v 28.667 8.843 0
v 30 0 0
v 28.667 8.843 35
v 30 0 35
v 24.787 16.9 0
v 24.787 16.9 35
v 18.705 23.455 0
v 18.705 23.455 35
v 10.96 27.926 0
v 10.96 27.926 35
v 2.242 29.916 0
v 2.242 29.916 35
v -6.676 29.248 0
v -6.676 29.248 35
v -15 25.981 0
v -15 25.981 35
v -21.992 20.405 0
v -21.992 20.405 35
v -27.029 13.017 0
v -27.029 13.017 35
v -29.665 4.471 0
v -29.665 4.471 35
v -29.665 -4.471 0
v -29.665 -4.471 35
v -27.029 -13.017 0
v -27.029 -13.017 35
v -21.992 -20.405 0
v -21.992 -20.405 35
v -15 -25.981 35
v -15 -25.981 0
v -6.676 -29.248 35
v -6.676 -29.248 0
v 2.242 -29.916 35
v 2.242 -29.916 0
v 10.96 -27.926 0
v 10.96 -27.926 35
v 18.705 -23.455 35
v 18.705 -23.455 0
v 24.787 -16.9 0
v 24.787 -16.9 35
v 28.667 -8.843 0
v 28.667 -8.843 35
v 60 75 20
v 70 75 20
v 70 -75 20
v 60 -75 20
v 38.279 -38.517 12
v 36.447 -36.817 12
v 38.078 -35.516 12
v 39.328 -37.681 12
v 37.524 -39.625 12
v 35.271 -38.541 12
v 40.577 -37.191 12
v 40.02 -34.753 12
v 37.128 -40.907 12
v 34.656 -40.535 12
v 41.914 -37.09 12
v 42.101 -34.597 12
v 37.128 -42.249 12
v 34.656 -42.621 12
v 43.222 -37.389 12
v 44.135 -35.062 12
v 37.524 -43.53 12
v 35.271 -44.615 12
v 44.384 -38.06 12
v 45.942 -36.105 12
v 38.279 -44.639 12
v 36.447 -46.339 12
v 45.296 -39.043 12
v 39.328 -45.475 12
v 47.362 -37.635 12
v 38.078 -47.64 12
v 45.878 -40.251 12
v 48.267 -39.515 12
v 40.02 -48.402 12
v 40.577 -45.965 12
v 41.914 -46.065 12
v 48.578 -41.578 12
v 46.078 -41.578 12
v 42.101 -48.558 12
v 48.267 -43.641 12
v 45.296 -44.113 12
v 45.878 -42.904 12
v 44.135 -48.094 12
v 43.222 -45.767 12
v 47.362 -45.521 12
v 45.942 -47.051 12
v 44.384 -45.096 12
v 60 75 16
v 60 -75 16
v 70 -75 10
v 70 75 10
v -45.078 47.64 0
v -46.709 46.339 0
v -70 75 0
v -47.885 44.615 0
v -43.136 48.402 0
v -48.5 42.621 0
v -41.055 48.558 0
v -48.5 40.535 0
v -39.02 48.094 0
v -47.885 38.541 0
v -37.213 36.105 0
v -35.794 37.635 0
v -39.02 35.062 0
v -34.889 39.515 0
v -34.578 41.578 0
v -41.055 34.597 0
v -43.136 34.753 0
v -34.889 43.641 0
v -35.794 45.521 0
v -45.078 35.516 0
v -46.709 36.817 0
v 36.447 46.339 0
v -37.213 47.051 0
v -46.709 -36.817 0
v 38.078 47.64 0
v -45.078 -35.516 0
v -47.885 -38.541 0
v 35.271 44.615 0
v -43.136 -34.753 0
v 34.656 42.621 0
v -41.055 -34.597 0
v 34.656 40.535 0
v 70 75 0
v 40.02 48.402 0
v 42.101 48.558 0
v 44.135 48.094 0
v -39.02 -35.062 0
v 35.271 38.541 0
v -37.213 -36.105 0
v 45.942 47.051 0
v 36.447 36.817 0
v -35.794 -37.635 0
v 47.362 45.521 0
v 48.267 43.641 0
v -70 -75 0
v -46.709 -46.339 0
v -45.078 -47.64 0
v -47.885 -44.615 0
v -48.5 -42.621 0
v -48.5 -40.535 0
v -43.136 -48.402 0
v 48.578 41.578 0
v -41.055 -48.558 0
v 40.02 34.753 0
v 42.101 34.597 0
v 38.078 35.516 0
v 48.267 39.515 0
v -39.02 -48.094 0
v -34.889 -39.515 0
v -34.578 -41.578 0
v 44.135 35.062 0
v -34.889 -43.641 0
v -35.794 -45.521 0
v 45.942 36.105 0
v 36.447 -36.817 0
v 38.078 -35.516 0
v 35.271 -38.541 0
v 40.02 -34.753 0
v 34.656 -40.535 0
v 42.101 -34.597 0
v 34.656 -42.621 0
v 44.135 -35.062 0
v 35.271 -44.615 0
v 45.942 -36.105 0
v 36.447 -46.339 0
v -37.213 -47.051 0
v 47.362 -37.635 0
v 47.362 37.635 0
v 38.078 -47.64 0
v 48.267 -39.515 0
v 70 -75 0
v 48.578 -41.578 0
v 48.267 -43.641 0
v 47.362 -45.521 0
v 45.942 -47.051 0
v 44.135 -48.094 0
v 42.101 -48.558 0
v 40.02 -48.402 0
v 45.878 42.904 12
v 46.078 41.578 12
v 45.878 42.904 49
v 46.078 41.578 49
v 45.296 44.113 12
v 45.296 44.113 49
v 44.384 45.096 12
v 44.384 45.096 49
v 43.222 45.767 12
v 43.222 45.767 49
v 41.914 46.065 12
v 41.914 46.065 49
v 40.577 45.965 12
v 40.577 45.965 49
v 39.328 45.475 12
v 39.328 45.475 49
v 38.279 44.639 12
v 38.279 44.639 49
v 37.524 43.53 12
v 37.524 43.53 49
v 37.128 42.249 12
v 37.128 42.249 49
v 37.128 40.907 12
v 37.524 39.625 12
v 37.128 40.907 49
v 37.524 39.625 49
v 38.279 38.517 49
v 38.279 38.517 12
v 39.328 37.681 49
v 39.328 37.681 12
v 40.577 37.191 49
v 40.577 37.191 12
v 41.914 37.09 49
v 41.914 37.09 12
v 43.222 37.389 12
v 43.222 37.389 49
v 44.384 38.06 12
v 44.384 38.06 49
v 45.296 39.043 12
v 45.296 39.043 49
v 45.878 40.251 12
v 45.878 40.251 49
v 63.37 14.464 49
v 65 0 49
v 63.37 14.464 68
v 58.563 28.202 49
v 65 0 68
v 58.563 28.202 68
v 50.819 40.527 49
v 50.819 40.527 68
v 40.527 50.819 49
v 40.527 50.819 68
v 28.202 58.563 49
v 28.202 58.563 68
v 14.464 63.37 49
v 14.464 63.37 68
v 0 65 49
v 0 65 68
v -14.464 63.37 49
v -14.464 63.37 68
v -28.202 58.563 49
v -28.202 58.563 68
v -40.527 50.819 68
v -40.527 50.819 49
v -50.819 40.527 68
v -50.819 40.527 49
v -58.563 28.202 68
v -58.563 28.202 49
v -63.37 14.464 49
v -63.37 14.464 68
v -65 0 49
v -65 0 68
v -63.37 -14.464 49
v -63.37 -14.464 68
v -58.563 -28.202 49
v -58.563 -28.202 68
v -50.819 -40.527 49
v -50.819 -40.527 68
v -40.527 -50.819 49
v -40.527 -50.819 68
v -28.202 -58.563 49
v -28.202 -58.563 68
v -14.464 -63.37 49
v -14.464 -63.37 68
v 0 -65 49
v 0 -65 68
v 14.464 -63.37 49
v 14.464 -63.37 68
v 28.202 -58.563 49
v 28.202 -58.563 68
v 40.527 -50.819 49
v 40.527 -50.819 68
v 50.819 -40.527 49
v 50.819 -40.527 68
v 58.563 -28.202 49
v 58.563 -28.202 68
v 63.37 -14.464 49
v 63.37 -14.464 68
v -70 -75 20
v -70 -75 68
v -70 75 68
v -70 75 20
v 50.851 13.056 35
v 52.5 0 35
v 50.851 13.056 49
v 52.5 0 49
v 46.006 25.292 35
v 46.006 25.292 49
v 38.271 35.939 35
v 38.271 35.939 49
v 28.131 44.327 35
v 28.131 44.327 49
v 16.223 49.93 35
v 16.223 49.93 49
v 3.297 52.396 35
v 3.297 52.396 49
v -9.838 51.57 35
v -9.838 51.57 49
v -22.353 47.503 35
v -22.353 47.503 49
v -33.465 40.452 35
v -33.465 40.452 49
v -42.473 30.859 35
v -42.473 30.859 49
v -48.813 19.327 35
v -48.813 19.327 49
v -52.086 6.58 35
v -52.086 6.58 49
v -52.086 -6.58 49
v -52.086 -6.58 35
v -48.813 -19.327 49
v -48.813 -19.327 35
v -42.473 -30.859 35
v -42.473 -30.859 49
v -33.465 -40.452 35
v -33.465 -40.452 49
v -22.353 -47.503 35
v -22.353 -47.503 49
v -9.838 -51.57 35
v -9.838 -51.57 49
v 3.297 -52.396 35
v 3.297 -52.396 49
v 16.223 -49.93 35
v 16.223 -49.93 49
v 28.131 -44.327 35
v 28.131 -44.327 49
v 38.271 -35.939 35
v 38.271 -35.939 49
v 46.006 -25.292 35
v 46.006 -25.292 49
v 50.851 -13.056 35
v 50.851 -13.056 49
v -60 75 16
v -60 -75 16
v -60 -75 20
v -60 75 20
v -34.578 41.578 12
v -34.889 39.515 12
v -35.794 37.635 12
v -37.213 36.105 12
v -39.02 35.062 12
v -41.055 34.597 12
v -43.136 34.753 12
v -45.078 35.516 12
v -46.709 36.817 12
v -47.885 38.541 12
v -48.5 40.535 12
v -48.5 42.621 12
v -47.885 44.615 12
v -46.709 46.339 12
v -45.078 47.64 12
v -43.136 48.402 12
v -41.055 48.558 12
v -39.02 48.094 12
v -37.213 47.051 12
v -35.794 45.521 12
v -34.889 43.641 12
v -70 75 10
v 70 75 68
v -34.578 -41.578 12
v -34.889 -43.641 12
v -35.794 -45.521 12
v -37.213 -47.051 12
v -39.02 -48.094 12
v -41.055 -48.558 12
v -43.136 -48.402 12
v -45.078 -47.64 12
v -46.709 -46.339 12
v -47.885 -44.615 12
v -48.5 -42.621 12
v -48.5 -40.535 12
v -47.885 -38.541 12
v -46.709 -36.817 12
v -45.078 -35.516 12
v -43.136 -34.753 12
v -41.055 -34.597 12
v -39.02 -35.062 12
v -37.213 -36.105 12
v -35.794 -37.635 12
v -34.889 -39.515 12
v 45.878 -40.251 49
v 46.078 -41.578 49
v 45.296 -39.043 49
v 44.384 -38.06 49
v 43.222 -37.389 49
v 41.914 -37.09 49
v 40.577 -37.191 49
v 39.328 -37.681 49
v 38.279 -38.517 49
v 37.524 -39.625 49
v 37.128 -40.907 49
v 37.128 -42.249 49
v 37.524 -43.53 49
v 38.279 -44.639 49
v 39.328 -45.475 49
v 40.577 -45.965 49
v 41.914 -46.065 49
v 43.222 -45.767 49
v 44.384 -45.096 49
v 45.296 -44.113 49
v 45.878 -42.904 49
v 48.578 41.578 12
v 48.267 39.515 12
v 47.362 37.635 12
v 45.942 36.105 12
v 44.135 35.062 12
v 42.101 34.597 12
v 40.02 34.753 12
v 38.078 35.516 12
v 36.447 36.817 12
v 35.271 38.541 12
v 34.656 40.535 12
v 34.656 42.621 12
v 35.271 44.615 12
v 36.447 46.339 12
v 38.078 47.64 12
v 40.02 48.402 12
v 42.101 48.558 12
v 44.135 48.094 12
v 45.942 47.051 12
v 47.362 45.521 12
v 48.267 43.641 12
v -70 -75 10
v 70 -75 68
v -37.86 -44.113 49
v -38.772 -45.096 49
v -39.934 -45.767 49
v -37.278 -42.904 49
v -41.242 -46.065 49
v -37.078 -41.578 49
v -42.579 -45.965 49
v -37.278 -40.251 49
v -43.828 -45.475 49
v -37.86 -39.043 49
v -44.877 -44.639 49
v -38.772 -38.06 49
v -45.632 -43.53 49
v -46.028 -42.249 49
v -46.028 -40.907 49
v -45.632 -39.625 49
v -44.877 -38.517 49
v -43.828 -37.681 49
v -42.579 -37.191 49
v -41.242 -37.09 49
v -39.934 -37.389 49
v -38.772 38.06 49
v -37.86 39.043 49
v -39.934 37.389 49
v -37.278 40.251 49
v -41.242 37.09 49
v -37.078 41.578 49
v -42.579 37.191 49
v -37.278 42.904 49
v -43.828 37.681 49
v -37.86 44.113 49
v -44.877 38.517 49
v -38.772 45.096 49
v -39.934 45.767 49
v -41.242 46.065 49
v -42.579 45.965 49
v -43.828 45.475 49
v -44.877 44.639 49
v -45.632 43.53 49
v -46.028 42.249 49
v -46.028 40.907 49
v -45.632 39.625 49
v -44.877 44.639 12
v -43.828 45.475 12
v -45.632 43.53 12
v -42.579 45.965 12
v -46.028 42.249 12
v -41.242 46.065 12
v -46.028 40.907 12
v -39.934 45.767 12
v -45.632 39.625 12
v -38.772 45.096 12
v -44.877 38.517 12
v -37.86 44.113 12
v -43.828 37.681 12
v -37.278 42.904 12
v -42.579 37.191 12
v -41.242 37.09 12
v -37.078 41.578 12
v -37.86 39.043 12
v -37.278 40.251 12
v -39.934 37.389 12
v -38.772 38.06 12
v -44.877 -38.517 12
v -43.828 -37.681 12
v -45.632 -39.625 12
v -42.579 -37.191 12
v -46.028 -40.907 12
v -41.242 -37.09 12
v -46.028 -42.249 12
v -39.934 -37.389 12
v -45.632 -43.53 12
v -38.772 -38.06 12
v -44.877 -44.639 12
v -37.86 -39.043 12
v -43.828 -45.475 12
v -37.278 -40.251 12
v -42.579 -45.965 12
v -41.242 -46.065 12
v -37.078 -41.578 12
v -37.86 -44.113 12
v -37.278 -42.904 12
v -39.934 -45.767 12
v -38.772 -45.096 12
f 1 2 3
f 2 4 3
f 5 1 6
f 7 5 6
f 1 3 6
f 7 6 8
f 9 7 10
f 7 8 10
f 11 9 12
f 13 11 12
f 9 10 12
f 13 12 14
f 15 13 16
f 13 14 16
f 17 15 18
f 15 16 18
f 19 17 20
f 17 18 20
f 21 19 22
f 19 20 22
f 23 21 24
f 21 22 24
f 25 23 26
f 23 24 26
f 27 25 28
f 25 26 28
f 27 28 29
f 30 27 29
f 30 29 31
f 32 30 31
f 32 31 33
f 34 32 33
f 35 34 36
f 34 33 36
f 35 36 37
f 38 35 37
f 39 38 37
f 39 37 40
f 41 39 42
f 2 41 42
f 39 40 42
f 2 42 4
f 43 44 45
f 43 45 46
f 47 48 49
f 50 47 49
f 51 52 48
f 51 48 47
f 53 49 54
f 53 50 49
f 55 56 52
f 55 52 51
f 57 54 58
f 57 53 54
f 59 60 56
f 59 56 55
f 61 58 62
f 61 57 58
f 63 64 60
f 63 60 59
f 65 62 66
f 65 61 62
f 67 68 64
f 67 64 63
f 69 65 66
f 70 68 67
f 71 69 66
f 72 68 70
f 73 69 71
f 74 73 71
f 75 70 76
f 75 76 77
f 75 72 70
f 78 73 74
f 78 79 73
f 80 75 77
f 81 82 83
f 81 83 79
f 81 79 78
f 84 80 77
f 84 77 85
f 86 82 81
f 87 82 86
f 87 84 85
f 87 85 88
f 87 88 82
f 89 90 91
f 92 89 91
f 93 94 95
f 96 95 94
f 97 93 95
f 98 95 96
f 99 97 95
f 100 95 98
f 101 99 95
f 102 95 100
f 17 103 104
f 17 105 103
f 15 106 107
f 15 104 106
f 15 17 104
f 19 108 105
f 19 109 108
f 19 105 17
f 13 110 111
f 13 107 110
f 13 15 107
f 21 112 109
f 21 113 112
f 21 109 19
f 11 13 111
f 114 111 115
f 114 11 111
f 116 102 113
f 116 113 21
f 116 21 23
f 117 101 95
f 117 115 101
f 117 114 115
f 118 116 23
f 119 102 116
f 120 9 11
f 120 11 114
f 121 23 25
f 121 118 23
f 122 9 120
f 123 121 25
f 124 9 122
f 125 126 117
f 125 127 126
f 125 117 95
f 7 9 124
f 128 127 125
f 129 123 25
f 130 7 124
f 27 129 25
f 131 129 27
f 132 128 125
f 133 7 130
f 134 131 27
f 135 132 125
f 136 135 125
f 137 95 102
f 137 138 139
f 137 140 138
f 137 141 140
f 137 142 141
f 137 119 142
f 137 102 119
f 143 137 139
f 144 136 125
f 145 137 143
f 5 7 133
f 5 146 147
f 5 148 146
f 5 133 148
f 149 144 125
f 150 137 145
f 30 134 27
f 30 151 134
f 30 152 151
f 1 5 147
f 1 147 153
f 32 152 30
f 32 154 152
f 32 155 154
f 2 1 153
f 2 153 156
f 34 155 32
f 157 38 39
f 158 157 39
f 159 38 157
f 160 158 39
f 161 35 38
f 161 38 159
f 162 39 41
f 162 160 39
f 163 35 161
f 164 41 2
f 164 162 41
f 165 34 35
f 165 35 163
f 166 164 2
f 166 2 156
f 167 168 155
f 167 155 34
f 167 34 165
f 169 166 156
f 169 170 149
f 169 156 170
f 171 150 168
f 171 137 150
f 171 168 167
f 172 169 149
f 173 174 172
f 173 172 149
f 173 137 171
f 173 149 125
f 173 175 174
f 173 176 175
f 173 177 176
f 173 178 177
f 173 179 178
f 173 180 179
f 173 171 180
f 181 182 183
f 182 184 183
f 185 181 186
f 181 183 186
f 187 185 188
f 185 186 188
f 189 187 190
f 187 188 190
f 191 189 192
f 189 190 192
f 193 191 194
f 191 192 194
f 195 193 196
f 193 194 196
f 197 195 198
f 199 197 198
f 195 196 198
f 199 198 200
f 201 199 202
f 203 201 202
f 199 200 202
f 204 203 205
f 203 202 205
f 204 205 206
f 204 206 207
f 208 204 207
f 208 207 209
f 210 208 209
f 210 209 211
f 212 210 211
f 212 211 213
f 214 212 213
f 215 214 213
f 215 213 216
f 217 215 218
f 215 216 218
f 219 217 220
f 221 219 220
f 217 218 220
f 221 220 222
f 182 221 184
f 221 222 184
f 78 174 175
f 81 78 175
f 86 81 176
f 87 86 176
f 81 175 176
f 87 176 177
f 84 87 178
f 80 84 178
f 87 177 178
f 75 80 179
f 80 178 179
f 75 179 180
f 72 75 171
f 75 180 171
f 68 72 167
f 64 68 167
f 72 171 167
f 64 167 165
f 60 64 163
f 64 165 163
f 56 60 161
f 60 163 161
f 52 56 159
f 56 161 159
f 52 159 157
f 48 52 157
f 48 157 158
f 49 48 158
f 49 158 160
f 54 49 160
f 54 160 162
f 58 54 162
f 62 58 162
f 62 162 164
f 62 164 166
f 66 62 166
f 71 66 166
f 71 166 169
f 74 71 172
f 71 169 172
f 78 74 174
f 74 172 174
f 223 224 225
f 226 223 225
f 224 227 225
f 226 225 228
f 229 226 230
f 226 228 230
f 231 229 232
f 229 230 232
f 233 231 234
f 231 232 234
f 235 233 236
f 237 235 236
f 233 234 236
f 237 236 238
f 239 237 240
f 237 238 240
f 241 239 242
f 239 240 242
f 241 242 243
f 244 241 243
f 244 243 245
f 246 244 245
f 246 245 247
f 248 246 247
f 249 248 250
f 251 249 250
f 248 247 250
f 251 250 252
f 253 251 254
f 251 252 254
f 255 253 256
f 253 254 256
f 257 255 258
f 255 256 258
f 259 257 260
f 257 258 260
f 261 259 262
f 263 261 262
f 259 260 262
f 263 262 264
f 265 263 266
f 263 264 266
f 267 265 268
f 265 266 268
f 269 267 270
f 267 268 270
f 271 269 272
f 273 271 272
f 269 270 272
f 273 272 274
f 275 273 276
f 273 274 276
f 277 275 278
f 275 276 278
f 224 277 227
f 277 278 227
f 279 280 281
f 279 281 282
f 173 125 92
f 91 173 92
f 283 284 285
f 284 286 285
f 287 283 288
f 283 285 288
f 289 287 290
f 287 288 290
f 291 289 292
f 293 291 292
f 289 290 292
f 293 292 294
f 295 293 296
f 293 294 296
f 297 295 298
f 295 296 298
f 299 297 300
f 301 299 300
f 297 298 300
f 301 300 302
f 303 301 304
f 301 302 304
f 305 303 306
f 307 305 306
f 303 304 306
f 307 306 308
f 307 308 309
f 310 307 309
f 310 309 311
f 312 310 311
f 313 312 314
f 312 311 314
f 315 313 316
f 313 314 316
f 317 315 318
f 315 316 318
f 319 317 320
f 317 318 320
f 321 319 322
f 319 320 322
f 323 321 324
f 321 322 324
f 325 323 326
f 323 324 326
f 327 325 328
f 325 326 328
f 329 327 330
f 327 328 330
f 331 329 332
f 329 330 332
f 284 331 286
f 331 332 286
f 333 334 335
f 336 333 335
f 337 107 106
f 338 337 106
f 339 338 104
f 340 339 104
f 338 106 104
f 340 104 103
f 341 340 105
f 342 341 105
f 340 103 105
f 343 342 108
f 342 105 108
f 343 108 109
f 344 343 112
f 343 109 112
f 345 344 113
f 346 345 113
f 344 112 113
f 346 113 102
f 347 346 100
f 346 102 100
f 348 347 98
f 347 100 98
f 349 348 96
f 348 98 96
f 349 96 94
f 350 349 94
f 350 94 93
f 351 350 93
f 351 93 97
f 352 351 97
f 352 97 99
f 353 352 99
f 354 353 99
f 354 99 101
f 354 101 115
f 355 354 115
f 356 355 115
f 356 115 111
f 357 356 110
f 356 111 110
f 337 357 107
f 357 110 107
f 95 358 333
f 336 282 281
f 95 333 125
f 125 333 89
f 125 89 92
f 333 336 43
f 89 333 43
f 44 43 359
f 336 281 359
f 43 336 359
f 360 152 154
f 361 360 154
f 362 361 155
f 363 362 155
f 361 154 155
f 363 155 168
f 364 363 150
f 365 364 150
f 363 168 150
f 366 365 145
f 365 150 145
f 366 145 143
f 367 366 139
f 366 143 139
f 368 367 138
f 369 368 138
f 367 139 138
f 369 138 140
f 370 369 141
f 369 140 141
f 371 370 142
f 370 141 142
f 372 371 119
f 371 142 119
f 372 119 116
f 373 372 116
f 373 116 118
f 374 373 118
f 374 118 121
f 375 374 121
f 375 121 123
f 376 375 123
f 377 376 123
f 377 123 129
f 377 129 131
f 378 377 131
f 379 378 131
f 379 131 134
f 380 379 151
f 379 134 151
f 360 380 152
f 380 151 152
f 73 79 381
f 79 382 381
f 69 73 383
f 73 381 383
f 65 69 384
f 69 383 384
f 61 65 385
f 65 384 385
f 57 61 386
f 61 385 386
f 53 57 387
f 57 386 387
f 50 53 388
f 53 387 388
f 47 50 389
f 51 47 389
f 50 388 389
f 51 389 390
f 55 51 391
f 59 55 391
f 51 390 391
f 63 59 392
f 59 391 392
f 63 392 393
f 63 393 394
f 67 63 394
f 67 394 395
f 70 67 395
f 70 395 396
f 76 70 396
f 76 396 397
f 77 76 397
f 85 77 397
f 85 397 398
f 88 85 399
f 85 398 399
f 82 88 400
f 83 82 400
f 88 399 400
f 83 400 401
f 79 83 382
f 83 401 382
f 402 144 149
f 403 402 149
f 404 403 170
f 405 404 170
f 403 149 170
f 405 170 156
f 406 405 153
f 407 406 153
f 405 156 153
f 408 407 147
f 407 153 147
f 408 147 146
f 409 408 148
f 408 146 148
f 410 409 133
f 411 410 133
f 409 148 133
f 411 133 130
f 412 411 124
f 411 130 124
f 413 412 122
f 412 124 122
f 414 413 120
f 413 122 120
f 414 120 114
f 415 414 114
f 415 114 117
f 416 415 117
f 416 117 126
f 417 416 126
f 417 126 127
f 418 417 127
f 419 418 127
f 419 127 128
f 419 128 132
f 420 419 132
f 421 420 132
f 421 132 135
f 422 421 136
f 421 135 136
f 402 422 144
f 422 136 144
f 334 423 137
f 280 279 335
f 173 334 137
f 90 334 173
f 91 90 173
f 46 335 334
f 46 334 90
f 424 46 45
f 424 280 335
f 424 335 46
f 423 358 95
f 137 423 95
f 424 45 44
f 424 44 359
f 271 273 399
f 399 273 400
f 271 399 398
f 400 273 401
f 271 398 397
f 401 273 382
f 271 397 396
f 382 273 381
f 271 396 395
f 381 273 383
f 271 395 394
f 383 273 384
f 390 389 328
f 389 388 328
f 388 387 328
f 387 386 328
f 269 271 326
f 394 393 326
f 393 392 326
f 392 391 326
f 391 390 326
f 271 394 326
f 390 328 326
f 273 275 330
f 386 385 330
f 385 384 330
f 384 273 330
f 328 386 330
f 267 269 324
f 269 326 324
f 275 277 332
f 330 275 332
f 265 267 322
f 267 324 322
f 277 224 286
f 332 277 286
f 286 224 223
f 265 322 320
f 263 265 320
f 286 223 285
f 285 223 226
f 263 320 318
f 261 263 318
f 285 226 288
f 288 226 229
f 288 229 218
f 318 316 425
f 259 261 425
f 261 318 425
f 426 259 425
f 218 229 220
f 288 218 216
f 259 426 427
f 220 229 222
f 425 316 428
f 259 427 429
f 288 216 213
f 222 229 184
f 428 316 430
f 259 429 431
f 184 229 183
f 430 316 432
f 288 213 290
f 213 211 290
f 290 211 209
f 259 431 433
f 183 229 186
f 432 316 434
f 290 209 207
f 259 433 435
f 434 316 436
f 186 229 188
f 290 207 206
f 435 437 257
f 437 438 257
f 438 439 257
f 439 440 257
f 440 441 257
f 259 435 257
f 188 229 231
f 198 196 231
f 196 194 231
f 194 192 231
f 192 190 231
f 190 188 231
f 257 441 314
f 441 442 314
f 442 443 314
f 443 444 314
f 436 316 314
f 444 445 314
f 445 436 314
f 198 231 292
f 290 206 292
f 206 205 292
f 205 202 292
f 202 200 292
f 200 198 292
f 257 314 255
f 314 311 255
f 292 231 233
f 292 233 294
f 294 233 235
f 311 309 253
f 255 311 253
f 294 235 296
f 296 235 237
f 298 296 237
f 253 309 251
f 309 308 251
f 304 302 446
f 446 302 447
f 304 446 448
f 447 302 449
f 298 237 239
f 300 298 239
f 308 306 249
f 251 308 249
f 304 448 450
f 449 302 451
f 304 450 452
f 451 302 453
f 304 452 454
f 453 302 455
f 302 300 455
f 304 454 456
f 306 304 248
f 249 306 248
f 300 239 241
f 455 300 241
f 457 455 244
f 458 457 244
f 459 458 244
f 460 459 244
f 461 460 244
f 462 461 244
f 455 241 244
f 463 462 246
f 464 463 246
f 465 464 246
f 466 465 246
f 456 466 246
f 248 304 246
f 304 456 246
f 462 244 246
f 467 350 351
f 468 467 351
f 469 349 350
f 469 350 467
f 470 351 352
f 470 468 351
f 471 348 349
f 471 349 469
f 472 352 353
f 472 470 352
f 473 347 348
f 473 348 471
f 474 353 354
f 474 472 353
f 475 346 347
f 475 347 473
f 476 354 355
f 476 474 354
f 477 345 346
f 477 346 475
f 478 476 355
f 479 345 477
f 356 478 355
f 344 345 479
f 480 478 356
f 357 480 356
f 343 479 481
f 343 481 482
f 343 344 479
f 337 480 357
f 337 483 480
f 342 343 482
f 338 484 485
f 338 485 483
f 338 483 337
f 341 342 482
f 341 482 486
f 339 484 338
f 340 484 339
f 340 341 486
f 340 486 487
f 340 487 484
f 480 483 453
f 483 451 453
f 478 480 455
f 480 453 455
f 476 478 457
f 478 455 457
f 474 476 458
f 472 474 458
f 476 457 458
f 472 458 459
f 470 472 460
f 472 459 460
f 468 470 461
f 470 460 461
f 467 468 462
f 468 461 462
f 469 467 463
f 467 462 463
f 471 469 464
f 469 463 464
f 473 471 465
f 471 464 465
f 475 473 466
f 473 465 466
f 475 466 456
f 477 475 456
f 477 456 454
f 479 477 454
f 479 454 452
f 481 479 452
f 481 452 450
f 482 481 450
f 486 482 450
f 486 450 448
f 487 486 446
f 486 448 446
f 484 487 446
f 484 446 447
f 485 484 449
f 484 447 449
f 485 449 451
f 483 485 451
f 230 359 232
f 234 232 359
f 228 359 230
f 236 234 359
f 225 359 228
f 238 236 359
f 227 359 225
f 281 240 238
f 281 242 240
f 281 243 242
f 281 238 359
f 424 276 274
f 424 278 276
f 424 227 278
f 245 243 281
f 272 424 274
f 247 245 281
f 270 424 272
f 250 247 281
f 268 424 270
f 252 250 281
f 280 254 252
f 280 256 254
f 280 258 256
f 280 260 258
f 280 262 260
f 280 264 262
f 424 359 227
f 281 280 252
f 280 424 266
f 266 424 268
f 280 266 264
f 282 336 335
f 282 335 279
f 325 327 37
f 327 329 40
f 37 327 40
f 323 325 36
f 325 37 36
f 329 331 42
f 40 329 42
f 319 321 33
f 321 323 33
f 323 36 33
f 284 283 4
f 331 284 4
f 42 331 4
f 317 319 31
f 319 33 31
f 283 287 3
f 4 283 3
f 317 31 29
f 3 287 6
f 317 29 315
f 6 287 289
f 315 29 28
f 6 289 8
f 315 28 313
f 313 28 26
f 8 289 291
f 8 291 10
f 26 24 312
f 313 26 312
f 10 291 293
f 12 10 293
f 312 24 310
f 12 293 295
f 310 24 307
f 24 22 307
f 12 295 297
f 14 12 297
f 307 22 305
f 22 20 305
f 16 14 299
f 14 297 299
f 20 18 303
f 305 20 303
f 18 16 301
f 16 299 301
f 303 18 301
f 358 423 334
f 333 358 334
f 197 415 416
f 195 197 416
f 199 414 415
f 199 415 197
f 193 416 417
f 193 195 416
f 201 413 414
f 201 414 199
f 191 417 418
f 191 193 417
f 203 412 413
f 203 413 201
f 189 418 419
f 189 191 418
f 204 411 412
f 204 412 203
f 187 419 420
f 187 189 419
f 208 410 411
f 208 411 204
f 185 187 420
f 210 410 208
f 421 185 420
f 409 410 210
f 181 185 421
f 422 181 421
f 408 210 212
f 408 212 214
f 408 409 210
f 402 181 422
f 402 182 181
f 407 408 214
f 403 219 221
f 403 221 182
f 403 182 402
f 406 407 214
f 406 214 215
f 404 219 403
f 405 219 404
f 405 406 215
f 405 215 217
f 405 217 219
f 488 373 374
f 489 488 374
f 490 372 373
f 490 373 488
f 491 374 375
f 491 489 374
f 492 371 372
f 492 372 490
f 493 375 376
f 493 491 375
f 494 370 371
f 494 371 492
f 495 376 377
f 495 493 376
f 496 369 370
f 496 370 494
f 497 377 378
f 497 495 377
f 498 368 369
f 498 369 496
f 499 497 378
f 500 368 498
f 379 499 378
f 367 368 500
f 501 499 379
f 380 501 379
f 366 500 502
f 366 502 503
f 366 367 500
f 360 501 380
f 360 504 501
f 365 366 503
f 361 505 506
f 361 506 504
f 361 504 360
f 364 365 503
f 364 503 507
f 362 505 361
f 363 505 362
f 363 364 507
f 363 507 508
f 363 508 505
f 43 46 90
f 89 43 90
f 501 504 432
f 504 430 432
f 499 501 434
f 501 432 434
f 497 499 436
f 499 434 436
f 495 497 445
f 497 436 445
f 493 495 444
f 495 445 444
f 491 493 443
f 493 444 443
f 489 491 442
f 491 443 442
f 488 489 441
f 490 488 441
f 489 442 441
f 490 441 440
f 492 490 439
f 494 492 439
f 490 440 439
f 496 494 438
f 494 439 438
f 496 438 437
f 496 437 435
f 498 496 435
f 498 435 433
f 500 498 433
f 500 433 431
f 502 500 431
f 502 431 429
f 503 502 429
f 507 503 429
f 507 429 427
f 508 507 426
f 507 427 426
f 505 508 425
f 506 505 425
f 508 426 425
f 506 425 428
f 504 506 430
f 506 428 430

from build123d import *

# Parameters (mm, degrees)
F1_DEPTH = 75
F5_R     = 7
F6_DEPTH = 12
F4_R     = 4.5
F7_DEPTH = 37
F9_DEPTH = 150


with BuildPart() as f1:
    # F0 (on Front) → F1 (new body, symmetric)
    with BuildSketch(Plane.XZ):
        Polygon((-70, 0), (0, 0), (70, 0), (70, 68), (-70, 68), align=None)
    extrude(amount=F1_DEPTH, both=True)

    # F2 (on Front) → F3 (revolve, cut)
    with BuildSketch(Plane.XZ):
        Polygon((0, 68), (0, 0), (30, 0), (30, 35), (52.5, 35), (52.5, 49), (65, 49), (65, 68), align=None)
    revolve(axis=Axis((0, 0, 34), (0, 0, 1)), mode=Mode.SUBTRACT)

    # F5 (on face) → F6 (cut)
    with BuildSketch(Plane(origin=(0, 0, 0), x_dir=(1, 0, 0), z_dir=(0, 0, -1))):
        with Locations((41.577879, 41.577879)):
            Circle(F5_R)
        with Locations((41.577879, -41.577879)):
            Circle(F5_R)
        with Locations((-41.577879, -41.577879)):
            Circle(F5_R)
        with Locations((-41.577879, 41.577879)):
            Circle(F5_R)
    extrude(amount=-F6_DEPTH, mode=Mode.SUBTRACT)

    # F4 (on face) → F7 (cut, symmetric)
    with BuildSketch(Plane.XY.offset(35)):
        with Locations((41.577879, 41.577879)):
            Circle(F4_R)
        with Locations((41.577879, -41.577879)):
            Circle(F4_R)
        with Locations((-41.577879, -41.577879)):
            Circle(F4_R)
        with Locations((-41.577879, 41.577879)):
            Circle(F4_R)
    extrude(amount=F7_DEPTH, both=True, mode=Mode.SUBTRACT)

    # F8 (on face) → F9 (cut)
    with BuildSketch(Plane.XZ.offset(75)):
        Polygon((60, 16), (70, 10), (70, 20), (60, 20), align=None)
        Polygon((-60, 16), (-60, 20), (-70, 20), (-70, 10), align=None)
    extrude(amount=-F9_DEPTH, mode=Mode.SUBTRACT)


solid = f1.part
